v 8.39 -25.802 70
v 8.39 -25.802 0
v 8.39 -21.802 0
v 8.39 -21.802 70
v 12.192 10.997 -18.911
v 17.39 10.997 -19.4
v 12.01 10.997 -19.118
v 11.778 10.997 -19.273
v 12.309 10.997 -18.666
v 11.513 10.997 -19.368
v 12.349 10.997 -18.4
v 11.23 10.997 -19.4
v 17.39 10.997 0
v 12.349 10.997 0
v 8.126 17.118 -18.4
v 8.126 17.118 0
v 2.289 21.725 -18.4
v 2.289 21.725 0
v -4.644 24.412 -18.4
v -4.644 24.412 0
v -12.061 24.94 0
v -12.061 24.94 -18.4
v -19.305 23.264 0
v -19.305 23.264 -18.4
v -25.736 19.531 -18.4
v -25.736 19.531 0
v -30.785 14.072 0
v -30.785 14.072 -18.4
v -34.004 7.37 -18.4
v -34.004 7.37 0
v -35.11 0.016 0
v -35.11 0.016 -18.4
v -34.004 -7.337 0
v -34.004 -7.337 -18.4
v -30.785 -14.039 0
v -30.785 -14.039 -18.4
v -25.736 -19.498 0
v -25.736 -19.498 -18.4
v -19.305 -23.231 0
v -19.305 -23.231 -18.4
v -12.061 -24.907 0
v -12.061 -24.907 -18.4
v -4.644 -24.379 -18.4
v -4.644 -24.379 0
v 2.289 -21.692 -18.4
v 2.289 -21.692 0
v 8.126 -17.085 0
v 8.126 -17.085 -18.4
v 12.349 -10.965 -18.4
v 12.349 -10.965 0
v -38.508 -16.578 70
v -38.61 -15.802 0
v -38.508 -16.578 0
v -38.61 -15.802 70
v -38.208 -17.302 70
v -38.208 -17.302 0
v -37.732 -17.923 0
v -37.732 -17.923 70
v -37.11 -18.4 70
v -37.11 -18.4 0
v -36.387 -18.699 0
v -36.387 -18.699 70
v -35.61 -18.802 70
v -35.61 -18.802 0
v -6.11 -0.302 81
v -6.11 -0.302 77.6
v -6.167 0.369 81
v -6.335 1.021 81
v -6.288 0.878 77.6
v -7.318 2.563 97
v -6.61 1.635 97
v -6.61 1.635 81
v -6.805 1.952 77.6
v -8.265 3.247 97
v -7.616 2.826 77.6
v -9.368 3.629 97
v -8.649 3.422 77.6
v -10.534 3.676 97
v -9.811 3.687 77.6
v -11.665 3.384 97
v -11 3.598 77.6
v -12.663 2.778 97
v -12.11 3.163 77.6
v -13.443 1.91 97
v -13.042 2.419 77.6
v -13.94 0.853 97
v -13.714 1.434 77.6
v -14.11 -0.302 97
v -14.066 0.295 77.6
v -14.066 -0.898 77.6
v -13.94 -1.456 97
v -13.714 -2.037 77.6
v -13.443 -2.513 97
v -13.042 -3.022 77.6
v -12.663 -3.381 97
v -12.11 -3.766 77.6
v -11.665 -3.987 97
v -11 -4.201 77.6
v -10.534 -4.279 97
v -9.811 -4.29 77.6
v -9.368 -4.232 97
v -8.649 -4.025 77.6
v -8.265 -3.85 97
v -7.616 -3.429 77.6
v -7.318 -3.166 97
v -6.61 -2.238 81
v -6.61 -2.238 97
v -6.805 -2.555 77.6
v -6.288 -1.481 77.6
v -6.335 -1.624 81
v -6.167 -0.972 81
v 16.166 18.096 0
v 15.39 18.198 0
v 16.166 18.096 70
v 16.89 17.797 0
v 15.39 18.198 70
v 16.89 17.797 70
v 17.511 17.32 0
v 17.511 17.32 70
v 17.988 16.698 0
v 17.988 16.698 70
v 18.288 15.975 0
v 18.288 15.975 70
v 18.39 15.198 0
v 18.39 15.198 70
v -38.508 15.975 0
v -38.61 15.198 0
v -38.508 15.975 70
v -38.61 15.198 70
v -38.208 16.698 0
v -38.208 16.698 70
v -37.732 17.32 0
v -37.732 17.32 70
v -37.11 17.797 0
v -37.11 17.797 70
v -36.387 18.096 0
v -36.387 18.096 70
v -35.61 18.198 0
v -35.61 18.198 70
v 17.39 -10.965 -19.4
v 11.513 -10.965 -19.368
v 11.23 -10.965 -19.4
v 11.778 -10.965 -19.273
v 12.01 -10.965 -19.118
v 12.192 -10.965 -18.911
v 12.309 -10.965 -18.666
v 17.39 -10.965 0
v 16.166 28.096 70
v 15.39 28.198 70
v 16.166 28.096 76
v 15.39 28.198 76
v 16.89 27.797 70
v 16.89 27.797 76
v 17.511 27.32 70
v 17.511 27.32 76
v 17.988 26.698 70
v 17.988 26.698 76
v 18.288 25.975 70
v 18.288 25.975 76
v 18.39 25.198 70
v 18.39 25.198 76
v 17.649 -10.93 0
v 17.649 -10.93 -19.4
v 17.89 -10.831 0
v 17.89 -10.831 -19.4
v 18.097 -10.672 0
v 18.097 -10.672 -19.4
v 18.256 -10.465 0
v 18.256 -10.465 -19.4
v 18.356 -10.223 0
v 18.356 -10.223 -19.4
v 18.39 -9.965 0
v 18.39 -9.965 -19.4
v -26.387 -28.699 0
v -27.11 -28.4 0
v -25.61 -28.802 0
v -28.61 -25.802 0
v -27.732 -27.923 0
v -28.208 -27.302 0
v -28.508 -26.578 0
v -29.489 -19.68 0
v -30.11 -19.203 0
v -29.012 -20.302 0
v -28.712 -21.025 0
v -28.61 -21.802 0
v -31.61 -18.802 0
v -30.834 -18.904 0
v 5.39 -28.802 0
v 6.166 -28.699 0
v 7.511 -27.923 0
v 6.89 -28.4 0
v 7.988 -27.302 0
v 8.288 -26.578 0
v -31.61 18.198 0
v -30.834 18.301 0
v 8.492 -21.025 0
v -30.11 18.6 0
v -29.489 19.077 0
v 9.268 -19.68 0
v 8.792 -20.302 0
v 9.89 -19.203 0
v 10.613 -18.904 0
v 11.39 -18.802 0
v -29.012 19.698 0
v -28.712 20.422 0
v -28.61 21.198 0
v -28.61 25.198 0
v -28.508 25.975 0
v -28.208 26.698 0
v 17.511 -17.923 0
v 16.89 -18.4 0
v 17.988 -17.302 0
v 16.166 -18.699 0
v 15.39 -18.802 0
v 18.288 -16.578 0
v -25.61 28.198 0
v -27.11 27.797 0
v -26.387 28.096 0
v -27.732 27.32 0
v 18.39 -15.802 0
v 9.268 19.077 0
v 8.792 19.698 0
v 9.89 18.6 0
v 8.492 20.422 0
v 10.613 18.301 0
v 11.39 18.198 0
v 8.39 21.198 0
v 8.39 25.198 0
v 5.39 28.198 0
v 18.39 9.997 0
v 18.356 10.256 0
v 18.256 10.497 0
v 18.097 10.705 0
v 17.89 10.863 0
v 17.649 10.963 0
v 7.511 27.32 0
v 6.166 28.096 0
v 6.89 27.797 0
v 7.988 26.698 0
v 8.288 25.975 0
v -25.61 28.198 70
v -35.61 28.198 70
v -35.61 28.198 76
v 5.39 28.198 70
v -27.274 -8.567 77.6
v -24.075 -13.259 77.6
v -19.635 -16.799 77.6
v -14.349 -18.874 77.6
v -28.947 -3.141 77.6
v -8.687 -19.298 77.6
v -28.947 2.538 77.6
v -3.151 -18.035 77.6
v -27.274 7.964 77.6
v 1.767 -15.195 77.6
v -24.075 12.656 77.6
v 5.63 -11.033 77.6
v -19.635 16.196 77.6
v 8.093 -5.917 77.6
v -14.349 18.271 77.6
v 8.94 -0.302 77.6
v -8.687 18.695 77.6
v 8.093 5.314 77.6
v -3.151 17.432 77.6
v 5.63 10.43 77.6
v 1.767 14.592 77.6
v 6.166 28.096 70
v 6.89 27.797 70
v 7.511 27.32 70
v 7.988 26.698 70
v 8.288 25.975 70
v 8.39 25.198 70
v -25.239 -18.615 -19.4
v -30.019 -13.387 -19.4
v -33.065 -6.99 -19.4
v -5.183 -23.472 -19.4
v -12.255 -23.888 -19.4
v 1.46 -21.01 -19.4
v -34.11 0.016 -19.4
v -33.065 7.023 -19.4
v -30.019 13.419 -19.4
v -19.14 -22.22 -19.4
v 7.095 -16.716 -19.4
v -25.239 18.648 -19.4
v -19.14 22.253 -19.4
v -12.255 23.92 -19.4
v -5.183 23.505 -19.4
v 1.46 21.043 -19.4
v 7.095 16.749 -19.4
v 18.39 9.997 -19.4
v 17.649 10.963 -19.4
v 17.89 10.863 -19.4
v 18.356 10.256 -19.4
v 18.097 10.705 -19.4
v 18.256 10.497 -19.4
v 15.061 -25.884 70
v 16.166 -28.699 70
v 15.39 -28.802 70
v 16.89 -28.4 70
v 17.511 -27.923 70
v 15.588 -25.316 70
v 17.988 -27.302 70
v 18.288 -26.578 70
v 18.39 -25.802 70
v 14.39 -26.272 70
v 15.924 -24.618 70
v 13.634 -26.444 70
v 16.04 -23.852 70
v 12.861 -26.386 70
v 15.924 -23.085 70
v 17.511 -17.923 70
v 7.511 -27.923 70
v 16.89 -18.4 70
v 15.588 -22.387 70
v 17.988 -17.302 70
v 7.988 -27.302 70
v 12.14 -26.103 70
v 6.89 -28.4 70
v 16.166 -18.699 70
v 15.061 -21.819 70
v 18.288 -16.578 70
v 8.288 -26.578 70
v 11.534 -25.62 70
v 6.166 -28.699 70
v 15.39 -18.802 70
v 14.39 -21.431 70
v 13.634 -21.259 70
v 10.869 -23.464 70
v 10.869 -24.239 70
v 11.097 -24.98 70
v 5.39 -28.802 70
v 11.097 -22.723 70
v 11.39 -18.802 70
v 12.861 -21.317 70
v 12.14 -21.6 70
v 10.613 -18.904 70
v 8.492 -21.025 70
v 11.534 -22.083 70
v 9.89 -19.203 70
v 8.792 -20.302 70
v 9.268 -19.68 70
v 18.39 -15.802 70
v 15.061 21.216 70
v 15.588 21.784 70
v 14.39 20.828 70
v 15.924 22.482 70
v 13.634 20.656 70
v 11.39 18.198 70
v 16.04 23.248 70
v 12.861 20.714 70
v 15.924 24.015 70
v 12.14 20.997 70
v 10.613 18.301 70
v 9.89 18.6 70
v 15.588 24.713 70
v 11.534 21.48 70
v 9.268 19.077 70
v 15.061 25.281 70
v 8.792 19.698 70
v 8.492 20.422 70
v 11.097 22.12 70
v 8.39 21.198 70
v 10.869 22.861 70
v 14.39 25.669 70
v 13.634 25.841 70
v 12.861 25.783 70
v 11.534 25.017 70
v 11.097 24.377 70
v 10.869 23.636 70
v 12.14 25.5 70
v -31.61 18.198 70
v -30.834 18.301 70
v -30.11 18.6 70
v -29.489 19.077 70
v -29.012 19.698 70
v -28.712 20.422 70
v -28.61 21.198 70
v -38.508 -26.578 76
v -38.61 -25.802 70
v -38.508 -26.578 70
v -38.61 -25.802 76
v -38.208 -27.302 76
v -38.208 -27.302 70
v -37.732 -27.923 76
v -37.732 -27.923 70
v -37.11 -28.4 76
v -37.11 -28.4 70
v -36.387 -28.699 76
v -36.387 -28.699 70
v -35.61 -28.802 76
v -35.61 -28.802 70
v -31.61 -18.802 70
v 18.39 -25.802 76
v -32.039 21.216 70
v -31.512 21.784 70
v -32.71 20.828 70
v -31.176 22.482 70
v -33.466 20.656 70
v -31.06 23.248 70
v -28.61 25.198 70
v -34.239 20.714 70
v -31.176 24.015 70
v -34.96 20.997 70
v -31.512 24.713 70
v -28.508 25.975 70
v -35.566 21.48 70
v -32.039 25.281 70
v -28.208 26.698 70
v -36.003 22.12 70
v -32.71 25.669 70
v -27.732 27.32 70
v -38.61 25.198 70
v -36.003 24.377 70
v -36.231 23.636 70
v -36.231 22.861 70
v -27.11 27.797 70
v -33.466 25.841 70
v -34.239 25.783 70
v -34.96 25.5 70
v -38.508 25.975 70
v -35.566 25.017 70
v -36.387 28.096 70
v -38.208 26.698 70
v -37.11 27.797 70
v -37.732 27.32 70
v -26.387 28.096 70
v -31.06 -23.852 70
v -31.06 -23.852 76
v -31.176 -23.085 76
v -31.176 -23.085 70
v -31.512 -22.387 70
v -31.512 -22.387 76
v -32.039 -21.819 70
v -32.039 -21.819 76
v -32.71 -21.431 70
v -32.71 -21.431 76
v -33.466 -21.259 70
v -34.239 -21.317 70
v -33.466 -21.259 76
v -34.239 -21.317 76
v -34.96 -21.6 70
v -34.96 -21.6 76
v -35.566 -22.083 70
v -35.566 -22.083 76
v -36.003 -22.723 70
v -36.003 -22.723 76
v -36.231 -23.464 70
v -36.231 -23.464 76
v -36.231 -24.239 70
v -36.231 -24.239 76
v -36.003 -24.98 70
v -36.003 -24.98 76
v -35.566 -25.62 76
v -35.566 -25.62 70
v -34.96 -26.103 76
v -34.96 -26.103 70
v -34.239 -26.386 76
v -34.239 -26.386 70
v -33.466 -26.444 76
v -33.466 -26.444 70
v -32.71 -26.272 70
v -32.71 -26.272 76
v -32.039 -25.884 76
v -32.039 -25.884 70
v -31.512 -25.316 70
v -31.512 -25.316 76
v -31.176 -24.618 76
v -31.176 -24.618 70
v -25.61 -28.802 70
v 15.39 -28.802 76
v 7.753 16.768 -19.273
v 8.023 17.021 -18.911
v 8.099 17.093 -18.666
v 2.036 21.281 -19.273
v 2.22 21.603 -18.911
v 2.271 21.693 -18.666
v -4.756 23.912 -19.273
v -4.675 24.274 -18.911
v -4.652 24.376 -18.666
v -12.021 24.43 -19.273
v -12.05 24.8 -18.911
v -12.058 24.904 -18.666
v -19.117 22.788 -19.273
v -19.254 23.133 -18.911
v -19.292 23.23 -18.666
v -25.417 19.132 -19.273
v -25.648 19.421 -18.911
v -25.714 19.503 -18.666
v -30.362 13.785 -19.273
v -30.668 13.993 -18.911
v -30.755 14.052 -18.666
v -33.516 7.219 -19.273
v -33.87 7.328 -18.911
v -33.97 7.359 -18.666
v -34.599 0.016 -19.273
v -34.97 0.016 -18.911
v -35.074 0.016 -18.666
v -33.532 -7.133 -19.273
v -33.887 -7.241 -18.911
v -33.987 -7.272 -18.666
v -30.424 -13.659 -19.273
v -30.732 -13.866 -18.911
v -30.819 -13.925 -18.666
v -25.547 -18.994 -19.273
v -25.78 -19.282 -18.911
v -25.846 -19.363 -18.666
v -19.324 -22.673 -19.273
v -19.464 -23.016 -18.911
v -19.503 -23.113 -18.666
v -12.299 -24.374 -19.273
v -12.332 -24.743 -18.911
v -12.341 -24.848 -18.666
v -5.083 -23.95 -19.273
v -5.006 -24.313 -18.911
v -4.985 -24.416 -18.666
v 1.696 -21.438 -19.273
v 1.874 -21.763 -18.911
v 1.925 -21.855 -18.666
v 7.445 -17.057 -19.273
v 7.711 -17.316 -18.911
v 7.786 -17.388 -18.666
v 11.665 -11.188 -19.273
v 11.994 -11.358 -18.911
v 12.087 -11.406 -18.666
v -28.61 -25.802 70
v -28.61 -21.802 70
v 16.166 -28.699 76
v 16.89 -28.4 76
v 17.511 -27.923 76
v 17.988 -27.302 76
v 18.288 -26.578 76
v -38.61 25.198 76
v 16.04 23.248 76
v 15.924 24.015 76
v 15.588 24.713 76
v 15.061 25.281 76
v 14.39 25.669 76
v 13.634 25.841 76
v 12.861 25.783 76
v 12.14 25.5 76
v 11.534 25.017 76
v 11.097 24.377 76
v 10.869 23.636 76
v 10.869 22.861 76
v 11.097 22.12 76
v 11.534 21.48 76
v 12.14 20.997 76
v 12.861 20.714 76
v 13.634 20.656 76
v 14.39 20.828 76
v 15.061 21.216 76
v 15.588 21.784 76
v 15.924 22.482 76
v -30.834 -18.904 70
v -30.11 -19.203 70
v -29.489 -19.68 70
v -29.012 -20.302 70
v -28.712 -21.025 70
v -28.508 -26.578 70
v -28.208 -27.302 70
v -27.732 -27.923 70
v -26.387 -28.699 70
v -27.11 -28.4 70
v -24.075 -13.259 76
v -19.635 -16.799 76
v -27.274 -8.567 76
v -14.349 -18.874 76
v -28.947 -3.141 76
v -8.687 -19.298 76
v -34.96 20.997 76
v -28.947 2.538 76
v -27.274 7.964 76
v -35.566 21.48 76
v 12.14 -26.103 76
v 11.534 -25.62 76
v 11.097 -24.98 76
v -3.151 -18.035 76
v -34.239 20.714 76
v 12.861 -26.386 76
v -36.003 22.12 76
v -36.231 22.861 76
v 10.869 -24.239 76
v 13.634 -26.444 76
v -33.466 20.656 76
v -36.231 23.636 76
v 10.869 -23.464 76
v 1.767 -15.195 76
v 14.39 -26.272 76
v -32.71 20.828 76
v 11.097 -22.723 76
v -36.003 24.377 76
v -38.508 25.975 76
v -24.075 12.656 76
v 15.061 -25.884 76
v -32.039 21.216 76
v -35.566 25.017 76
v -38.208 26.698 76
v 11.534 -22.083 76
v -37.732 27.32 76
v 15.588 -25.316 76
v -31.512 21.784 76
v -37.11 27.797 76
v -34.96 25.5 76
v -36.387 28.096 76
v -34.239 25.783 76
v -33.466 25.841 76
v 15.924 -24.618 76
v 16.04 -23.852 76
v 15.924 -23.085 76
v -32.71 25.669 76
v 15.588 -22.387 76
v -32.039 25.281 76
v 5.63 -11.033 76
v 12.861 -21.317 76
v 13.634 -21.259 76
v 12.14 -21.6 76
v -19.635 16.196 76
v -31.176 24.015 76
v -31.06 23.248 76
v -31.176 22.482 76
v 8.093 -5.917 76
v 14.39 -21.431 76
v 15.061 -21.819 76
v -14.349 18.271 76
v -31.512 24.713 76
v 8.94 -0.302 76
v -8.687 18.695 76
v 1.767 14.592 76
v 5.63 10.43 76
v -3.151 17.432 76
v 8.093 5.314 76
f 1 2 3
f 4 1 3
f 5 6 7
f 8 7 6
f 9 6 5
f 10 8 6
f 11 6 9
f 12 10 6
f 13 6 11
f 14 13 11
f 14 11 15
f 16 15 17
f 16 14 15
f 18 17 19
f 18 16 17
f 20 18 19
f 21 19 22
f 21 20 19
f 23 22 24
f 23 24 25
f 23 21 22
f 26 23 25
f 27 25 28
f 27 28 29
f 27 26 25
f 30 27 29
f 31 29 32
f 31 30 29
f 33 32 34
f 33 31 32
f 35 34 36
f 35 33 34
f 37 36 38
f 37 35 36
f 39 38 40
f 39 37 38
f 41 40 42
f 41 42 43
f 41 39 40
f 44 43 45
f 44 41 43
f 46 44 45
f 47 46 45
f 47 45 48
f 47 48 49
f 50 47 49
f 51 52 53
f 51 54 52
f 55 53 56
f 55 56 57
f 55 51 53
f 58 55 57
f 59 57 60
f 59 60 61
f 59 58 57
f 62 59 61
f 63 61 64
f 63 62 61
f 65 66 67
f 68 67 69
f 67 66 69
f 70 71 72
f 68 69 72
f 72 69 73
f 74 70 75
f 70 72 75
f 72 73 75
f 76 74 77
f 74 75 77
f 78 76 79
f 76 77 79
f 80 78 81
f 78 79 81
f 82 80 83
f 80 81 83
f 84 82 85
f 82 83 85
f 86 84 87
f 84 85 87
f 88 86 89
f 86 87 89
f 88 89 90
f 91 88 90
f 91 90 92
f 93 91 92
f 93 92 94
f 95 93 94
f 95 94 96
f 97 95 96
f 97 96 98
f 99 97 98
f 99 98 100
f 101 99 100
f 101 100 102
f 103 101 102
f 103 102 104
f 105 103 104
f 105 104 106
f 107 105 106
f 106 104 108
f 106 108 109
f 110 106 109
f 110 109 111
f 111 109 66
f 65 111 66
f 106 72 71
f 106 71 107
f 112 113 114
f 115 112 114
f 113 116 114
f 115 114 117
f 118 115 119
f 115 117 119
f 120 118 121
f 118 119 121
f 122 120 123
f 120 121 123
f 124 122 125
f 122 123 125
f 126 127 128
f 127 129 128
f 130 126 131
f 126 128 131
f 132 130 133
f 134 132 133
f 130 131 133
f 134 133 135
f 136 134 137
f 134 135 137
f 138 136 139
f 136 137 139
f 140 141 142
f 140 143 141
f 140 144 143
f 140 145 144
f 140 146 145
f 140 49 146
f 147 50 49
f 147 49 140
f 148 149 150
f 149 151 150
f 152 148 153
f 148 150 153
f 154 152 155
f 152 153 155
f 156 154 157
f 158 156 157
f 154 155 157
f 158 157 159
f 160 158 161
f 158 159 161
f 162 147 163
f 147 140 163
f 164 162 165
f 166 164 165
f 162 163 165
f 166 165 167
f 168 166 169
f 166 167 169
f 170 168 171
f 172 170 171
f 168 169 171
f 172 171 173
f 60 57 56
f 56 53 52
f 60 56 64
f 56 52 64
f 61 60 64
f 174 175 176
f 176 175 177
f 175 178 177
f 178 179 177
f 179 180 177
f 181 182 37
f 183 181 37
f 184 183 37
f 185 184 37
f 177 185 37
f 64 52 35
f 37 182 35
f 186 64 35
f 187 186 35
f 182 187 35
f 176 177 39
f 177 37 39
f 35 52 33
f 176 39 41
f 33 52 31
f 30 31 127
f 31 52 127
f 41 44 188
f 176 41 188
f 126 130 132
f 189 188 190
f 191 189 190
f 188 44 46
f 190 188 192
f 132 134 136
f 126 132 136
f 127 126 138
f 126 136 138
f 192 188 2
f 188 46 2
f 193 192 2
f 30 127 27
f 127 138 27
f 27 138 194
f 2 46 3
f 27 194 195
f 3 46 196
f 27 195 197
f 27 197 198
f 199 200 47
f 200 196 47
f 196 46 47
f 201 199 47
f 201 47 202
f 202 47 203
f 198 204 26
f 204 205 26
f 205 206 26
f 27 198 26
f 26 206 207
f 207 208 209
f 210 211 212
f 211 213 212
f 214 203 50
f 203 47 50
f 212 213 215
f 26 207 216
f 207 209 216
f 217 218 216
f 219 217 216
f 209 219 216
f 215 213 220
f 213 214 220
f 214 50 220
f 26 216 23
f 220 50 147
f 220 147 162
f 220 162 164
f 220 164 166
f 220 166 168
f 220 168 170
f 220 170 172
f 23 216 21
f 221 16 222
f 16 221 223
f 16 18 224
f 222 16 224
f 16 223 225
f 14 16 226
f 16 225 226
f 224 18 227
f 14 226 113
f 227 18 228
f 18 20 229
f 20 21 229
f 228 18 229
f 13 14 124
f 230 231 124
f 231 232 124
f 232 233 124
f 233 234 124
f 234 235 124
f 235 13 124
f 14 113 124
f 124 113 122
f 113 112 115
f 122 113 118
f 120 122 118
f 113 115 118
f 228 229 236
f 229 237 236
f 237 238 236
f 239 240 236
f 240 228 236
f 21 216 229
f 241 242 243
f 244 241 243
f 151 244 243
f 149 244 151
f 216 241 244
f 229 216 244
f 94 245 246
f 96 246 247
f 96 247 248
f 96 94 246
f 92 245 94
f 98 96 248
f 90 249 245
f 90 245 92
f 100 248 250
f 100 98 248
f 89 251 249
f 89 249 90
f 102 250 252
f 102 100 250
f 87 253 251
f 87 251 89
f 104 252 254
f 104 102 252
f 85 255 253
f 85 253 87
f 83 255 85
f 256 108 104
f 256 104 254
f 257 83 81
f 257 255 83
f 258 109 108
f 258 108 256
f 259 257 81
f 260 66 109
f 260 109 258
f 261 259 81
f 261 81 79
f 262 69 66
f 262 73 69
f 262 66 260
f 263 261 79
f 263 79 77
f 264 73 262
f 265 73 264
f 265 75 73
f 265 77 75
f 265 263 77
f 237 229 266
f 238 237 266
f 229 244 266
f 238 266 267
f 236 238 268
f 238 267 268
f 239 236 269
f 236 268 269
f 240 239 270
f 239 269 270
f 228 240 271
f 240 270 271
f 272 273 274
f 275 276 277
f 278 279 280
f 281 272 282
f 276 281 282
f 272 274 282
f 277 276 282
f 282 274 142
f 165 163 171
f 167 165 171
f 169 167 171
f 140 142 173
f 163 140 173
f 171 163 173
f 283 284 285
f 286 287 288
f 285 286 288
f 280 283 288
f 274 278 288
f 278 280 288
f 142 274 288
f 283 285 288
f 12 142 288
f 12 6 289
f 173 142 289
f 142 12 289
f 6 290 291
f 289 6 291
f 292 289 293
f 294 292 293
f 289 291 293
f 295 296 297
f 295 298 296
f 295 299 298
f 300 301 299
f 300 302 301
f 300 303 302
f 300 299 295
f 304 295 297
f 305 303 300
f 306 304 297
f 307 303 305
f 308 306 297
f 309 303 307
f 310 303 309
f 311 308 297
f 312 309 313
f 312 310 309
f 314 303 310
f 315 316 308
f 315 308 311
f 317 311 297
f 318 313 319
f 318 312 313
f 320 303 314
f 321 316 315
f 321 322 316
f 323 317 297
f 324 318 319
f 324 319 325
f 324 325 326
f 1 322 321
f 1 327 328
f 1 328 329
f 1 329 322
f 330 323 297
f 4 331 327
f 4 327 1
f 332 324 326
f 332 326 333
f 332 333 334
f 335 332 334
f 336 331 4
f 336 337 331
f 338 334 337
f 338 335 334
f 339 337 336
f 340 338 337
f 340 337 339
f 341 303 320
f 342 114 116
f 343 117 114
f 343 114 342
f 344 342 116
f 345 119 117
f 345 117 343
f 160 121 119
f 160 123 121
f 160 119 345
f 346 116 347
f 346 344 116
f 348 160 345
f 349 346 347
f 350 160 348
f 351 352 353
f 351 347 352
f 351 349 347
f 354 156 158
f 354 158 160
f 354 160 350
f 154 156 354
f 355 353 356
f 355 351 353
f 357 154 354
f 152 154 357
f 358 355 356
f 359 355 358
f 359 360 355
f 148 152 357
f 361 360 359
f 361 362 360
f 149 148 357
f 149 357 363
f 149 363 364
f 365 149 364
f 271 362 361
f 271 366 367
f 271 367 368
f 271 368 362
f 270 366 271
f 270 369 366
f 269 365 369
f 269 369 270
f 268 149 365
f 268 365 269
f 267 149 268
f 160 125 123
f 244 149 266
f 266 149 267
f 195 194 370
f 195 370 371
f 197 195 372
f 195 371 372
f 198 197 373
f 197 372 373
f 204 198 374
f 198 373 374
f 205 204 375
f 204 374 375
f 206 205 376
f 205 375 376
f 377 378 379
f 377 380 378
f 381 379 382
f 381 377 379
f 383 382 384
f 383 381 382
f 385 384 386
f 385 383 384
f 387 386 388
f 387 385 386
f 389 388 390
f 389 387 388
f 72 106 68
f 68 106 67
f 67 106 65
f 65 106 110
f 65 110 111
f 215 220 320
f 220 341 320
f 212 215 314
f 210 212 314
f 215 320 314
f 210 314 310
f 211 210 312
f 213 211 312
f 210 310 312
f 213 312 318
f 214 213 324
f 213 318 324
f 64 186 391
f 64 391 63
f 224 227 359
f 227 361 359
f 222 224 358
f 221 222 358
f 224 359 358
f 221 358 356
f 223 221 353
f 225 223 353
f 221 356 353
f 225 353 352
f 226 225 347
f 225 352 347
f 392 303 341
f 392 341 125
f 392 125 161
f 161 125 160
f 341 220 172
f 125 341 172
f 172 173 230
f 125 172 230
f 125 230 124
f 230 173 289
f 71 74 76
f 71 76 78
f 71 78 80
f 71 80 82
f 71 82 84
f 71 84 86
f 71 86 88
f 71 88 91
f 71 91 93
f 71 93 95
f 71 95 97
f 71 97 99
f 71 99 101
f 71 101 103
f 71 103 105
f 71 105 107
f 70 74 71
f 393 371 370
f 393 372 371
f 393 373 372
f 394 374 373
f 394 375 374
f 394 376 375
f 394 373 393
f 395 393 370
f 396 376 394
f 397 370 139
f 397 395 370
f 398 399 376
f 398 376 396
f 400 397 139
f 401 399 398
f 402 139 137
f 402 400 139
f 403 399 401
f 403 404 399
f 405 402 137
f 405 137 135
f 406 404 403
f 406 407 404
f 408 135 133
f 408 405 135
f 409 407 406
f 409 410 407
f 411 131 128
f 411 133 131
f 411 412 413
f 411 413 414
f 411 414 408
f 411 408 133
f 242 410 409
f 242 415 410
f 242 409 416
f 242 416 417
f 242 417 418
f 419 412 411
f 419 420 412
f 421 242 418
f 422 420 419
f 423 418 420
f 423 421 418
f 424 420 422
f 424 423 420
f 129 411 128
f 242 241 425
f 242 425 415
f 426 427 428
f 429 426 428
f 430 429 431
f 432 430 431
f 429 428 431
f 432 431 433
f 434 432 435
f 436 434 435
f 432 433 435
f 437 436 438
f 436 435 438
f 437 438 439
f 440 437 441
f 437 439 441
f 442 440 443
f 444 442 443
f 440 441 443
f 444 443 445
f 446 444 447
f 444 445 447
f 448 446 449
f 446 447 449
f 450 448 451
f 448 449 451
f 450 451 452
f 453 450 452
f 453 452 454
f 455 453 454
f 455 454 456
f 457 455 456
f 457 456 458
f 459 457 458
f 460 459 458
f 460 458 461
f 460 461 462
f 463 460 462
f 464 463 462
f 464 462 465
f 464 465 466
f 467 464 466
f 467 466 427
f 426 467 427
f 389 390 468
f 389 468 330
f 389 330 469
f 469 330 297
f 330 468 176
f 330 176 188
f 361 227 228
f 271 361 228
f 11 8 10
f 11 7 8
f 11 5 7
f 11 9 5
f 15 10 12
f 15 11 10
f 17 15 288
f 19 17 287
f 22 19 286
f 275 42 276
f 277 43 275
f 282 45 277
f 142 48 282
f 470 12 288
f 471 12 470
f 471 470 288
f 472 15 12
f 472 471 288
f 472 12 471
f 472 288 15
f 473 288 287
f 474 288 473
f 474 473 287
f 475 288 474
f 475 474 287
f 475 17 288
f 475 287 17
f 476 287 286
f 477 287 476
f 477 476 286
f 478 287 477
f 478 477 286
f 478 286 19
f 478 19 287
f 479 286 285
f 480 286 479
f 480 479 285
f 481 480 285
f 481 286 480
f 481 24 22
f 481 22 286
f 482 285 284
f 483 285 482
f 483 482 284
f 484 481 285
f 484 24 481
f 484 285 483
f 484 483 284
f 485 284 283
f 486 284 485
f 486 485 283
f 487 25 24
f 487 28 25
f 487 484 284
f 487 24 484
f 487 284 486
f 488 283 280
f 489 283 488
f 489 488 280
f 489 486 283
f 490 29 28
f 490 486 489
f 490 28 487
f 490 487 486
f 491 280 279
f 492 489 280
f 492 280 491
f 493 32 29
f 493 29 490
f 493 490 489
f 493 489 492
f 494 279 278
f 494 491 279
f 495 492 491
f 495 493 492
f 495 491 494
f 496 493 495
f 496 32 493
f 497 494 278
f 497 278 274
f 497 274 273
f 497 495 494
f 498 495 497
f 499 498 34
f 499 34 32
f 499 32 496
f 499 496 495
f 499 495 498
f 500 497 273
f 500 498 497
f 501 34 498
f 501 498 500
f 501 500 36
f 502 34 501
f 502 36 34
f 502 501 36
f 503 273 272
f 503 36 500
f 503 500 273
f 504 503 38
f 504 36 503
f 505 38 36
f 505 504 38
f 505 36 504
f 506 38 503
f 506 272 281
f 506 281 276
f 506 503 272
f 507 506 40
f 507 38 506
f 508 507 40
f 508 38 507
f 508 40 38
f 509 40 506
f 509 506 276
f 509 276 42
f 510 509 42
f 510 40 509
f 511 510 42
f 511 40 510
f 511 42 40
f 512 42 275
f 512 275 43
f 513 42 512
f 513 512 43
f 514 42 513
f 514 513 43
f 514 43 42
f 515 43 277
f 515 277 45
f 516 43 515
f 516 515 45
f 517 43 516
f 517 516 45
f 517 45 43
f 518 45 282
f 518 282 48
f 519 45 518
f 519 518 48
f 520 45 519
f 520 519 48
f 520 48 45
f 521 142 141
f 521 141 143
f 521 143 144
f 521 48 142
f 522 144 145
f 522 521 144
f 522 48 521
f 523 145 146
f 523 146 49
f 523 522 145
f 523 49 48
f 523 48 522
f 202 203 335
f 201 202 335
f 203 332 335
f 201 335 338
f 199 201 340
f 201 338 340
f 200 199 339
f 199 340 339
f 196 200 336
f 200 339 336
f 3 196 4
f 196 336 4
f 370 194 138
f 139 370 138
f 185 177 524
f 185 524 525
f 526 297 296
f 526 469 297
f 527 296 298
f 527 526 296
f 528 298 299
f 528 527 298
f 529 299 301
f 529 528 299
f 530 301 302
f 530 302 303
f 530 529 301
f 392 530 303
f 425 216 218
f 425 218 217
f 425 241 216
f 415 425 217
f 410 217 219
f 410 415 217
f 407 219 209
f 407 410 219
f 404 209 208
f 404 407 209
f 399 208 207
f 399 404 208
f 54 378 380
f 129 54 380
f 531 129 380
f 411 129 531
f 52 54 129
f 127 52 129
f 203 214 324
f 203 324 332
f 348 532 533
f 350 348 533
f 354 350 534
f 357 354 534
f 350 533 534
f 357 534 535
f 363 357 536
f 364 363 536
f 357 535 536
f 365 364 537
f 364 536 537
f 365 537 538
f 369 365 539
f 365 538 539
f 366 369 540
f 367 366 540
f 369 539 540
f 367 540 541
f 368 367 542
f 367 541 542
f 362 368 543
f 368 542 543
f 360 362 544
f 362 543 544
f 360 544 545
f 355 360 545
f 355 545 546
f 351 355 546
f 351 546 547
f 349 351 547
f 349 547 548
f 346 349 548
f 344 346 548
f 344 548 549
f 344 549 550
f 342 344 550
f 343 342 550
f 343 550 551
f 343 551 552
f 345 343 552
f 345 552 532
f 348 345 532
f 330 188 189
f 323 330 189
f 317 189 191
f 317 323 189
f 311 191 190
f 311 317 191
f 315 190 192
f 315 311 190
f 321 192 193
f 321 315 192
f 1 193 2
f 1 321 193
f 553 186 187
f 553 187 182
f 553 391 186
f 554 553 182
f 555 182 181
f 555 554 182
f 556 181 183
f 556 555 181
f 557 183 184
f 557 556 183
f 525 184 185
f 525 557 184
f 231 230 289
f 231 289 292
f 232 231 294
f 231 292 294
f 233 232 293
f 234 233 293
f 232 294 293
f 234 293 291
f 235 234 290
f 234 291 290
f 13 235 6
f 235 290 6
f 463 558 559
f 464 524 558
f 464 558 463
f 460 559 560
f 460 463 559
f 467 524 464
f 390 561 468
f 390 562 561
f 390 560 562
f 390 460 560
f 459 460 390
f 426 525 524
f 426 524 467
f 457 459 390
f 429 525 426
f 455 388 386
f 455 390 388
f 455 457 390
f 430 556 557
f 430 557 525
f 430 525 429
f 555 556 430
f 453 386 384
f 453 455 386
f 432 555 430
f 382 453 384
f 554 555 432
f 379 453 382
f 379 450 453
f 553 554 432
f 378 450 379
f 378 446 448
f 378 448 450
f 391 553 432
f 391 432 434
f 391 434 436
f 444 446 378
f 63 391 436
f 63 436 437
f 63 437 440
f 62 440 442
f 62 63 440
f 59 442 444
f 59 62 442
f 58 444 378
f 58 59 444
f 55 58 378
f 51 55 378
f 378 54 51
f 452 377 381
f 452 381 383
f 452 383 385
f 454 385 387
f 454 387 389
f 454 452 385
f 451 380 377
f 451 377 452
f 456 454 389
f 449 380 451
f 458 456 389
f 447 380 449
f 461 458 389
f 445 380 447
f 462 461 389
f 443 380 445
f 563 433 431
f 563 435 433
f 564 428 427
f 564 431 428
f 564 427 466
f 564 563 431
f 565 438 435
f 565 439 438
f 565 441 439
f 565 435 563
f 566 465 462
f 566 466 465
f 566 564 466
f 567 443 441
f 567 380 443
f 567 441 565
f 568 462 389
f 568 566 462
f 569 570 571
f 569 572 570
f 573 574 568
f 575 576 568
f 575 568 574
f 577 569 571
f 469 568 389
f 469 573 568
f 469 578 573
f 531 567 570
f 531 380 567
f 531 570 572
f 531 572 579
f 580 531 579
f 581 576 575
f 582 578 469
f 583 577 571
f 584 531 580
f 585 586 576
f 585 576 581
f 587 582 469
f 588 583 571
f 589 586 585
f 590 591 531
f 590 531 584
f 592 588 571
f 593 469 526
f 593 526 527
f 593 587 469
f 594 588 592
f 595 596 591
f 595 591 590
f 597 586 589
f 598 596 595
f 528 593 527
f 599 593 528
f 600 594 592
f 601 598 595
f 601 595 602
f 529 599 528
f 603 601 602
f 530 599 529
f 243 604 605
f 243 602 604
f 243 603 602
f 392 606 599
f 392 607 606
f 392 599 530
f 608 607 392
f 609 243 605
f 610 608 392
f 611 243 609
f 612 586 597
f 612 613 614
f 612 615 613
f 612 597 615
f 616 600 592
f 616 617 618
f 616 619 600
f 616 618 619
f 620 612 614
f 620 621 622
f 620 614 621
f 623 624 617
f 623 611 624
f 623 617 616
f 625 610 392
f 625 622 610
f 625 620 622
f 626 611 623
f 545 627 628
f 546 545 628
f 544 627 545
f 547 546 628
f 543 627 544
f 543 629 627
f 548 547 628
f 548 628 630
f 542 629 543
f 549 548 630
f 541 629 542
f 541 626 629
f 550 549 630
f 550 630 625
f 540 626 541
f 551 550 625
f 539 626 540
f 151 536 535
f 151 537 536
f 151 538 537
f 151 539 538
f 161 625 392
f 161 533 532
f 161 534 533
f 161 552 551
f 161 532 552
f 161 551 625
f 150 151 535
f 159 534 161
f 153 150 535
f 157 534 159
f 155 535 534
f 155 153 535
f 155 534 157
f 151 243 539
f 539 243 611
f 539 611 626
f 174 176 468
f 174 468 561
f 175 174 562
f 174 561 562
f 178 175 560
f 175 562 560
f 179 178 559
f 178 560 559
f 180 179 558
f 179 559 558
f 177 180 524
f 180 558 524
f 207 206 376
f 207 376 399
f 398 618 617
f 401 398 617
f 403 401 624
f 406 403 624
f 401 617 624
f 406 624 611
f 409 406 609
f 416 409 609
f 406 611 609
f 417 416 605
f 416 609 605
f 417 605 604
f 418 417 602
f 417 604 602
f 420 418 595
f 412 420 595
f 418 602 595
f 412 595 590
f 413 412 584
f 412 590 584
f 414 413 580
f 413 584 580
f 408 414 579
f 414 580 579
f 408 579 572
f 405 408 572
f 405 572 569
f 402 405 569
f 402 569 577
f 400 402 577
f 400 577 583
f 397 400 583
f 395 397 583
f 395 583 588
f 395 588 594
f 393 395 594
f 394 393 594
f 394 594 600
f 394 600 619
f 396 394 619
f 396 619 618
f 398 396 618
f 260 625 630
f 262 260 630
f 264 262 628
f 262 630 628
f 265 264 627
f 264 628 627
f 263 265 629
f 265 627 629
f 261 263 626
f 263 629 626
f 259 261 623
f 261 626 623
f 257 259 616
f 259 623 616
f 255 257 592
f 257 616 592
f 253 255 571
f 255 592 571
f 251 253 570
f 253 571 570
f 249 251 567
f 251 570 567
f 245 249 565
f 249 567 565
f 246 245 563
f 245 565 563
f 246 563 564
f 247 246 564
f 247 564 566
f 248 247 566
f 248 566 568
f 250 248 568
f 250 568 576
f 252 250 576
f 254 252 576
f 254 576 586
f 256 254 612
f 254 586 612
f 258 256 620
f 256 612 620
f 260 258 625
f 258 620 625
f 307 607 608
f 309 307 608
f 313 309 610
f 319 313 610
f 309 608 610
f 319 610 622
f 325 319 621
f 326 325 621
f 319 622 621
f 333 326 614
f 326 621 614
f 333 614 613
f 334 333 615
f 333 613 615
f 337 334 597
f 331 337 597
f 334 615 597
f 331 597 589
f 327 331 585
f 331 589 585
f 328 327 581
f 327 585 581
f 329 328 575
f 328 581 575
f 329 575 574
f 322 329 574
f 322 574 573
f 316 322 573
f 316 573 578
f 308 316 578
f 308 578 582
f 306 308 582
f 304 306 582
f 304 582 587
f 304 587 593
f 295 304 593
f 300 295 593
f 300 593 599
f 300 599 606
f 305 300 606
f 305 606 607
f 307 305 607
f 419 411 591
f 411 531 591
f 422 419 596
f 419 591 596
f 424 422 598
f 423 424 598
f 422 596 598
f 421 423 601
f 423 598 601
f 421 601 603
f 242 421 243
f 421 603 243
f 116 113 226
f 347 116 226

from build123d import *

# Parameters (mm, degrees)
SKETCH_1_W          = 57
SKETCH_1_H          = 57
EXTRUDE_1_DEPTH     = 76
SKETCH_2_W          = 10
SKETCH_2_H          = 10
CUT_EXTRUDE_1_DEPTH = 70
SKETCH_3_R          = 2.6
CUT_EXTRUDE_2_DEPTH = 90.979320355
FILLET_2_R          = 3
SKETCH_4_R          = 19.05
EXTRUDE_2_DEPTH     = 1.6
SKETCH_5_R          = 4
EXTRUDE_3_DEPTH     = 19.4
CUT_EXTRUDE_START   = -16
CUT_EXTRUDE_3_DEPTH = 16
EXTRUDE_4_DEPTH     = 19.4
FILLET_3_R          = 1
FILLET_4_R          = 1
FILLET_5_R          = 1


with BuildPart() as part:
    # 草图1 → 凸台-拉伸1 (new body)
    with BuildSketch(Plane.XY):
        with Locations((-10.110253485, -0.301500263)):
            Rectangle(SKETCH_1_W, SKETCH_1_H)
    extrude(amount=EXTRUDE_1_DEPTH)

    # 草图2 → 切除-拉伸1 (cut)
    with BuildSketch(Plane(origin=(0, 0, 0), x_dir=(-1, 0, 0), z_dir=(0, 0, -1))):
        with Locations((-13.389746515, 23.198499737)):
            Rectangle(SKETCH_2_W, SKETCH_2_H)
        with Locations((33.610253485, 23.198499737)):
            Rectangle(SKETCH_2_W, SKETCH_2_H)
        with Locations((33.610253485, -23.801500263)):
            Rectangle(SKETCH_2_W, SKETCH_2_H)
        with Locations((-13.389746515, -23.801500263)):
            Rectangle(SKETCH_2_W, SKETCH_2_H)
    extrude(amount=-CUT_EXTRUDE_1_DEPTH, mode=Mode.SUBTRACT)

    # 草图3 → 切除-拉伸2 (cut, through all)
    with BuildSketch(Plane.XY.offset(76)):
        with Locations((13.439746515, 23.248499737)):
            Circle(SKETCH_3_R)
        with Locations((-33.660253485, 23.248499737)):
            Circle(SKETCH_3_R)
        with Locations((-33.660253485, -23.851500263)):
            Circle(SKETCH_3_R)
        with Locations((13.439746515, -23.851500263)):
            Circle(SKETCH_3_R)
    extrude(amount=-CUT_EXTRUDE_2_DEPTH, mode=Mode.SUBTRACT)

    # 圆角2
    fillet_2_edges = [part.edges().sort_by_distance(p)[0] for p in [
        (18.389746515, 18.198499737, 35),
        (8.389746515, 28.198499737, 35),
        (8.389746515, 18.198499737, 35),
        (-38.610253485, 18.198499737, 35),
        (-28.610253485, 18.198499737, 35),
        (-28.610253485, 28.198499737, 35),
        (-38.610253485, -18.801500263, 35),
        (-28.610253485, -28.801500263, 35),
        (-28.610253485, -18.801500263, 35),
        (18.389746515, -18.801500263, 35),
        (8.389746515, -18.801500263, 35),
        (8.389746515, -28.801500263, 35),
        (-38.610253485, 28.198499737, 73),
        (18.389746515, 28.198499737, 73),
        (18.389746515, -28.801500263, 73),
        (-38.610253485, -28.801500263, 73),
    ]]
    fillet(fillet_2_edges, radius=FILLET_2_R)

    # 草图4 → 凸台-拉伸2 (add)
    with BuildSketch(Plane.XY.offset(76)):
        with Locations((-10.110253485, -0.301500263)):
            Circle(SKETCH_4_R)
    extrude(amount=EXTRUDE_2_DEPTH)

    # 草图5 → 凸台-拉伸3 (add)
    with BuildSketch(Plane.XY.offset(77.6)):
        with Locations((-10.110253485, -0.301500263)):
            Circle(SKETCH_5_R)
    extrude(amount=EXTRUDE_3_DEPTH)

    # 草图6 → 切除-拉伸3 (cut)
    with BuildSketch(Plane.XY.offset(97).offset(CUT_EXTRUDE_START)):
        with BuildLine():
            Line((-6.610253485, 1.63499141), (-6.610253485, -2.237991937))
            ThreePointArc((-6.610253485, -2.237991937), (-6.110253485, -0.301500263), (-6.610253485, 1.63499141))
        make_face()
    extrude(amount=CUT_EXTRUDE_3_DEPTH, mode=Mode.SUBTRACT)

    # 草图7 → 凸台-拉伸4 (add)
    with BuildSketch(Plane(origin=(0, 0, 0), x_dir=(-1, 0, 0), z_dir=(0, 0, -1))):
        with BuildLine():
            Line((-12.349002987, -10.964529416), (-18.389746515, -10.964529416))
            Line((-18.389746515, -10.964529416), (-18.389746515, 10.997444042))
            Line((-18.389746515, 10.997444042), (-12.349002987, 10.997444042))
            ThreePointArc((-12.349002987, 10.997444042), (35.110247456, 0.016457313), (-12.349002987, -10.964529416))
        make_face()
    extrude(amount=EXTRUDE_4_DEPTH)

    # 圆角3
    fillet_3_edges = [part.edges().sort_by_distance(p)[0] for p in [
        (18.389746515, 10.997444042, -9.7),
    ]]
    fillet(fillet_3_edges, radius=FILLET_3_R)

    # 圆角4
    fillet_4_edges = [part.edges().sort_by_distance(p)[0] for p in [
        (18.389746515, -10.964529416, -9.7),
    ]]
    fillet(fillet_4_edges, radius=FILLET_4_R)

    # 圆角5
    fillet_5_edges = [part.edges().sort_by_distance(p)[0] for p in [
        (-35.110247456, 0.016457313, -19.4),
    ]]
    fillet(fillet_5_edges, radius=FILLET_5_R)


solid = part.part
